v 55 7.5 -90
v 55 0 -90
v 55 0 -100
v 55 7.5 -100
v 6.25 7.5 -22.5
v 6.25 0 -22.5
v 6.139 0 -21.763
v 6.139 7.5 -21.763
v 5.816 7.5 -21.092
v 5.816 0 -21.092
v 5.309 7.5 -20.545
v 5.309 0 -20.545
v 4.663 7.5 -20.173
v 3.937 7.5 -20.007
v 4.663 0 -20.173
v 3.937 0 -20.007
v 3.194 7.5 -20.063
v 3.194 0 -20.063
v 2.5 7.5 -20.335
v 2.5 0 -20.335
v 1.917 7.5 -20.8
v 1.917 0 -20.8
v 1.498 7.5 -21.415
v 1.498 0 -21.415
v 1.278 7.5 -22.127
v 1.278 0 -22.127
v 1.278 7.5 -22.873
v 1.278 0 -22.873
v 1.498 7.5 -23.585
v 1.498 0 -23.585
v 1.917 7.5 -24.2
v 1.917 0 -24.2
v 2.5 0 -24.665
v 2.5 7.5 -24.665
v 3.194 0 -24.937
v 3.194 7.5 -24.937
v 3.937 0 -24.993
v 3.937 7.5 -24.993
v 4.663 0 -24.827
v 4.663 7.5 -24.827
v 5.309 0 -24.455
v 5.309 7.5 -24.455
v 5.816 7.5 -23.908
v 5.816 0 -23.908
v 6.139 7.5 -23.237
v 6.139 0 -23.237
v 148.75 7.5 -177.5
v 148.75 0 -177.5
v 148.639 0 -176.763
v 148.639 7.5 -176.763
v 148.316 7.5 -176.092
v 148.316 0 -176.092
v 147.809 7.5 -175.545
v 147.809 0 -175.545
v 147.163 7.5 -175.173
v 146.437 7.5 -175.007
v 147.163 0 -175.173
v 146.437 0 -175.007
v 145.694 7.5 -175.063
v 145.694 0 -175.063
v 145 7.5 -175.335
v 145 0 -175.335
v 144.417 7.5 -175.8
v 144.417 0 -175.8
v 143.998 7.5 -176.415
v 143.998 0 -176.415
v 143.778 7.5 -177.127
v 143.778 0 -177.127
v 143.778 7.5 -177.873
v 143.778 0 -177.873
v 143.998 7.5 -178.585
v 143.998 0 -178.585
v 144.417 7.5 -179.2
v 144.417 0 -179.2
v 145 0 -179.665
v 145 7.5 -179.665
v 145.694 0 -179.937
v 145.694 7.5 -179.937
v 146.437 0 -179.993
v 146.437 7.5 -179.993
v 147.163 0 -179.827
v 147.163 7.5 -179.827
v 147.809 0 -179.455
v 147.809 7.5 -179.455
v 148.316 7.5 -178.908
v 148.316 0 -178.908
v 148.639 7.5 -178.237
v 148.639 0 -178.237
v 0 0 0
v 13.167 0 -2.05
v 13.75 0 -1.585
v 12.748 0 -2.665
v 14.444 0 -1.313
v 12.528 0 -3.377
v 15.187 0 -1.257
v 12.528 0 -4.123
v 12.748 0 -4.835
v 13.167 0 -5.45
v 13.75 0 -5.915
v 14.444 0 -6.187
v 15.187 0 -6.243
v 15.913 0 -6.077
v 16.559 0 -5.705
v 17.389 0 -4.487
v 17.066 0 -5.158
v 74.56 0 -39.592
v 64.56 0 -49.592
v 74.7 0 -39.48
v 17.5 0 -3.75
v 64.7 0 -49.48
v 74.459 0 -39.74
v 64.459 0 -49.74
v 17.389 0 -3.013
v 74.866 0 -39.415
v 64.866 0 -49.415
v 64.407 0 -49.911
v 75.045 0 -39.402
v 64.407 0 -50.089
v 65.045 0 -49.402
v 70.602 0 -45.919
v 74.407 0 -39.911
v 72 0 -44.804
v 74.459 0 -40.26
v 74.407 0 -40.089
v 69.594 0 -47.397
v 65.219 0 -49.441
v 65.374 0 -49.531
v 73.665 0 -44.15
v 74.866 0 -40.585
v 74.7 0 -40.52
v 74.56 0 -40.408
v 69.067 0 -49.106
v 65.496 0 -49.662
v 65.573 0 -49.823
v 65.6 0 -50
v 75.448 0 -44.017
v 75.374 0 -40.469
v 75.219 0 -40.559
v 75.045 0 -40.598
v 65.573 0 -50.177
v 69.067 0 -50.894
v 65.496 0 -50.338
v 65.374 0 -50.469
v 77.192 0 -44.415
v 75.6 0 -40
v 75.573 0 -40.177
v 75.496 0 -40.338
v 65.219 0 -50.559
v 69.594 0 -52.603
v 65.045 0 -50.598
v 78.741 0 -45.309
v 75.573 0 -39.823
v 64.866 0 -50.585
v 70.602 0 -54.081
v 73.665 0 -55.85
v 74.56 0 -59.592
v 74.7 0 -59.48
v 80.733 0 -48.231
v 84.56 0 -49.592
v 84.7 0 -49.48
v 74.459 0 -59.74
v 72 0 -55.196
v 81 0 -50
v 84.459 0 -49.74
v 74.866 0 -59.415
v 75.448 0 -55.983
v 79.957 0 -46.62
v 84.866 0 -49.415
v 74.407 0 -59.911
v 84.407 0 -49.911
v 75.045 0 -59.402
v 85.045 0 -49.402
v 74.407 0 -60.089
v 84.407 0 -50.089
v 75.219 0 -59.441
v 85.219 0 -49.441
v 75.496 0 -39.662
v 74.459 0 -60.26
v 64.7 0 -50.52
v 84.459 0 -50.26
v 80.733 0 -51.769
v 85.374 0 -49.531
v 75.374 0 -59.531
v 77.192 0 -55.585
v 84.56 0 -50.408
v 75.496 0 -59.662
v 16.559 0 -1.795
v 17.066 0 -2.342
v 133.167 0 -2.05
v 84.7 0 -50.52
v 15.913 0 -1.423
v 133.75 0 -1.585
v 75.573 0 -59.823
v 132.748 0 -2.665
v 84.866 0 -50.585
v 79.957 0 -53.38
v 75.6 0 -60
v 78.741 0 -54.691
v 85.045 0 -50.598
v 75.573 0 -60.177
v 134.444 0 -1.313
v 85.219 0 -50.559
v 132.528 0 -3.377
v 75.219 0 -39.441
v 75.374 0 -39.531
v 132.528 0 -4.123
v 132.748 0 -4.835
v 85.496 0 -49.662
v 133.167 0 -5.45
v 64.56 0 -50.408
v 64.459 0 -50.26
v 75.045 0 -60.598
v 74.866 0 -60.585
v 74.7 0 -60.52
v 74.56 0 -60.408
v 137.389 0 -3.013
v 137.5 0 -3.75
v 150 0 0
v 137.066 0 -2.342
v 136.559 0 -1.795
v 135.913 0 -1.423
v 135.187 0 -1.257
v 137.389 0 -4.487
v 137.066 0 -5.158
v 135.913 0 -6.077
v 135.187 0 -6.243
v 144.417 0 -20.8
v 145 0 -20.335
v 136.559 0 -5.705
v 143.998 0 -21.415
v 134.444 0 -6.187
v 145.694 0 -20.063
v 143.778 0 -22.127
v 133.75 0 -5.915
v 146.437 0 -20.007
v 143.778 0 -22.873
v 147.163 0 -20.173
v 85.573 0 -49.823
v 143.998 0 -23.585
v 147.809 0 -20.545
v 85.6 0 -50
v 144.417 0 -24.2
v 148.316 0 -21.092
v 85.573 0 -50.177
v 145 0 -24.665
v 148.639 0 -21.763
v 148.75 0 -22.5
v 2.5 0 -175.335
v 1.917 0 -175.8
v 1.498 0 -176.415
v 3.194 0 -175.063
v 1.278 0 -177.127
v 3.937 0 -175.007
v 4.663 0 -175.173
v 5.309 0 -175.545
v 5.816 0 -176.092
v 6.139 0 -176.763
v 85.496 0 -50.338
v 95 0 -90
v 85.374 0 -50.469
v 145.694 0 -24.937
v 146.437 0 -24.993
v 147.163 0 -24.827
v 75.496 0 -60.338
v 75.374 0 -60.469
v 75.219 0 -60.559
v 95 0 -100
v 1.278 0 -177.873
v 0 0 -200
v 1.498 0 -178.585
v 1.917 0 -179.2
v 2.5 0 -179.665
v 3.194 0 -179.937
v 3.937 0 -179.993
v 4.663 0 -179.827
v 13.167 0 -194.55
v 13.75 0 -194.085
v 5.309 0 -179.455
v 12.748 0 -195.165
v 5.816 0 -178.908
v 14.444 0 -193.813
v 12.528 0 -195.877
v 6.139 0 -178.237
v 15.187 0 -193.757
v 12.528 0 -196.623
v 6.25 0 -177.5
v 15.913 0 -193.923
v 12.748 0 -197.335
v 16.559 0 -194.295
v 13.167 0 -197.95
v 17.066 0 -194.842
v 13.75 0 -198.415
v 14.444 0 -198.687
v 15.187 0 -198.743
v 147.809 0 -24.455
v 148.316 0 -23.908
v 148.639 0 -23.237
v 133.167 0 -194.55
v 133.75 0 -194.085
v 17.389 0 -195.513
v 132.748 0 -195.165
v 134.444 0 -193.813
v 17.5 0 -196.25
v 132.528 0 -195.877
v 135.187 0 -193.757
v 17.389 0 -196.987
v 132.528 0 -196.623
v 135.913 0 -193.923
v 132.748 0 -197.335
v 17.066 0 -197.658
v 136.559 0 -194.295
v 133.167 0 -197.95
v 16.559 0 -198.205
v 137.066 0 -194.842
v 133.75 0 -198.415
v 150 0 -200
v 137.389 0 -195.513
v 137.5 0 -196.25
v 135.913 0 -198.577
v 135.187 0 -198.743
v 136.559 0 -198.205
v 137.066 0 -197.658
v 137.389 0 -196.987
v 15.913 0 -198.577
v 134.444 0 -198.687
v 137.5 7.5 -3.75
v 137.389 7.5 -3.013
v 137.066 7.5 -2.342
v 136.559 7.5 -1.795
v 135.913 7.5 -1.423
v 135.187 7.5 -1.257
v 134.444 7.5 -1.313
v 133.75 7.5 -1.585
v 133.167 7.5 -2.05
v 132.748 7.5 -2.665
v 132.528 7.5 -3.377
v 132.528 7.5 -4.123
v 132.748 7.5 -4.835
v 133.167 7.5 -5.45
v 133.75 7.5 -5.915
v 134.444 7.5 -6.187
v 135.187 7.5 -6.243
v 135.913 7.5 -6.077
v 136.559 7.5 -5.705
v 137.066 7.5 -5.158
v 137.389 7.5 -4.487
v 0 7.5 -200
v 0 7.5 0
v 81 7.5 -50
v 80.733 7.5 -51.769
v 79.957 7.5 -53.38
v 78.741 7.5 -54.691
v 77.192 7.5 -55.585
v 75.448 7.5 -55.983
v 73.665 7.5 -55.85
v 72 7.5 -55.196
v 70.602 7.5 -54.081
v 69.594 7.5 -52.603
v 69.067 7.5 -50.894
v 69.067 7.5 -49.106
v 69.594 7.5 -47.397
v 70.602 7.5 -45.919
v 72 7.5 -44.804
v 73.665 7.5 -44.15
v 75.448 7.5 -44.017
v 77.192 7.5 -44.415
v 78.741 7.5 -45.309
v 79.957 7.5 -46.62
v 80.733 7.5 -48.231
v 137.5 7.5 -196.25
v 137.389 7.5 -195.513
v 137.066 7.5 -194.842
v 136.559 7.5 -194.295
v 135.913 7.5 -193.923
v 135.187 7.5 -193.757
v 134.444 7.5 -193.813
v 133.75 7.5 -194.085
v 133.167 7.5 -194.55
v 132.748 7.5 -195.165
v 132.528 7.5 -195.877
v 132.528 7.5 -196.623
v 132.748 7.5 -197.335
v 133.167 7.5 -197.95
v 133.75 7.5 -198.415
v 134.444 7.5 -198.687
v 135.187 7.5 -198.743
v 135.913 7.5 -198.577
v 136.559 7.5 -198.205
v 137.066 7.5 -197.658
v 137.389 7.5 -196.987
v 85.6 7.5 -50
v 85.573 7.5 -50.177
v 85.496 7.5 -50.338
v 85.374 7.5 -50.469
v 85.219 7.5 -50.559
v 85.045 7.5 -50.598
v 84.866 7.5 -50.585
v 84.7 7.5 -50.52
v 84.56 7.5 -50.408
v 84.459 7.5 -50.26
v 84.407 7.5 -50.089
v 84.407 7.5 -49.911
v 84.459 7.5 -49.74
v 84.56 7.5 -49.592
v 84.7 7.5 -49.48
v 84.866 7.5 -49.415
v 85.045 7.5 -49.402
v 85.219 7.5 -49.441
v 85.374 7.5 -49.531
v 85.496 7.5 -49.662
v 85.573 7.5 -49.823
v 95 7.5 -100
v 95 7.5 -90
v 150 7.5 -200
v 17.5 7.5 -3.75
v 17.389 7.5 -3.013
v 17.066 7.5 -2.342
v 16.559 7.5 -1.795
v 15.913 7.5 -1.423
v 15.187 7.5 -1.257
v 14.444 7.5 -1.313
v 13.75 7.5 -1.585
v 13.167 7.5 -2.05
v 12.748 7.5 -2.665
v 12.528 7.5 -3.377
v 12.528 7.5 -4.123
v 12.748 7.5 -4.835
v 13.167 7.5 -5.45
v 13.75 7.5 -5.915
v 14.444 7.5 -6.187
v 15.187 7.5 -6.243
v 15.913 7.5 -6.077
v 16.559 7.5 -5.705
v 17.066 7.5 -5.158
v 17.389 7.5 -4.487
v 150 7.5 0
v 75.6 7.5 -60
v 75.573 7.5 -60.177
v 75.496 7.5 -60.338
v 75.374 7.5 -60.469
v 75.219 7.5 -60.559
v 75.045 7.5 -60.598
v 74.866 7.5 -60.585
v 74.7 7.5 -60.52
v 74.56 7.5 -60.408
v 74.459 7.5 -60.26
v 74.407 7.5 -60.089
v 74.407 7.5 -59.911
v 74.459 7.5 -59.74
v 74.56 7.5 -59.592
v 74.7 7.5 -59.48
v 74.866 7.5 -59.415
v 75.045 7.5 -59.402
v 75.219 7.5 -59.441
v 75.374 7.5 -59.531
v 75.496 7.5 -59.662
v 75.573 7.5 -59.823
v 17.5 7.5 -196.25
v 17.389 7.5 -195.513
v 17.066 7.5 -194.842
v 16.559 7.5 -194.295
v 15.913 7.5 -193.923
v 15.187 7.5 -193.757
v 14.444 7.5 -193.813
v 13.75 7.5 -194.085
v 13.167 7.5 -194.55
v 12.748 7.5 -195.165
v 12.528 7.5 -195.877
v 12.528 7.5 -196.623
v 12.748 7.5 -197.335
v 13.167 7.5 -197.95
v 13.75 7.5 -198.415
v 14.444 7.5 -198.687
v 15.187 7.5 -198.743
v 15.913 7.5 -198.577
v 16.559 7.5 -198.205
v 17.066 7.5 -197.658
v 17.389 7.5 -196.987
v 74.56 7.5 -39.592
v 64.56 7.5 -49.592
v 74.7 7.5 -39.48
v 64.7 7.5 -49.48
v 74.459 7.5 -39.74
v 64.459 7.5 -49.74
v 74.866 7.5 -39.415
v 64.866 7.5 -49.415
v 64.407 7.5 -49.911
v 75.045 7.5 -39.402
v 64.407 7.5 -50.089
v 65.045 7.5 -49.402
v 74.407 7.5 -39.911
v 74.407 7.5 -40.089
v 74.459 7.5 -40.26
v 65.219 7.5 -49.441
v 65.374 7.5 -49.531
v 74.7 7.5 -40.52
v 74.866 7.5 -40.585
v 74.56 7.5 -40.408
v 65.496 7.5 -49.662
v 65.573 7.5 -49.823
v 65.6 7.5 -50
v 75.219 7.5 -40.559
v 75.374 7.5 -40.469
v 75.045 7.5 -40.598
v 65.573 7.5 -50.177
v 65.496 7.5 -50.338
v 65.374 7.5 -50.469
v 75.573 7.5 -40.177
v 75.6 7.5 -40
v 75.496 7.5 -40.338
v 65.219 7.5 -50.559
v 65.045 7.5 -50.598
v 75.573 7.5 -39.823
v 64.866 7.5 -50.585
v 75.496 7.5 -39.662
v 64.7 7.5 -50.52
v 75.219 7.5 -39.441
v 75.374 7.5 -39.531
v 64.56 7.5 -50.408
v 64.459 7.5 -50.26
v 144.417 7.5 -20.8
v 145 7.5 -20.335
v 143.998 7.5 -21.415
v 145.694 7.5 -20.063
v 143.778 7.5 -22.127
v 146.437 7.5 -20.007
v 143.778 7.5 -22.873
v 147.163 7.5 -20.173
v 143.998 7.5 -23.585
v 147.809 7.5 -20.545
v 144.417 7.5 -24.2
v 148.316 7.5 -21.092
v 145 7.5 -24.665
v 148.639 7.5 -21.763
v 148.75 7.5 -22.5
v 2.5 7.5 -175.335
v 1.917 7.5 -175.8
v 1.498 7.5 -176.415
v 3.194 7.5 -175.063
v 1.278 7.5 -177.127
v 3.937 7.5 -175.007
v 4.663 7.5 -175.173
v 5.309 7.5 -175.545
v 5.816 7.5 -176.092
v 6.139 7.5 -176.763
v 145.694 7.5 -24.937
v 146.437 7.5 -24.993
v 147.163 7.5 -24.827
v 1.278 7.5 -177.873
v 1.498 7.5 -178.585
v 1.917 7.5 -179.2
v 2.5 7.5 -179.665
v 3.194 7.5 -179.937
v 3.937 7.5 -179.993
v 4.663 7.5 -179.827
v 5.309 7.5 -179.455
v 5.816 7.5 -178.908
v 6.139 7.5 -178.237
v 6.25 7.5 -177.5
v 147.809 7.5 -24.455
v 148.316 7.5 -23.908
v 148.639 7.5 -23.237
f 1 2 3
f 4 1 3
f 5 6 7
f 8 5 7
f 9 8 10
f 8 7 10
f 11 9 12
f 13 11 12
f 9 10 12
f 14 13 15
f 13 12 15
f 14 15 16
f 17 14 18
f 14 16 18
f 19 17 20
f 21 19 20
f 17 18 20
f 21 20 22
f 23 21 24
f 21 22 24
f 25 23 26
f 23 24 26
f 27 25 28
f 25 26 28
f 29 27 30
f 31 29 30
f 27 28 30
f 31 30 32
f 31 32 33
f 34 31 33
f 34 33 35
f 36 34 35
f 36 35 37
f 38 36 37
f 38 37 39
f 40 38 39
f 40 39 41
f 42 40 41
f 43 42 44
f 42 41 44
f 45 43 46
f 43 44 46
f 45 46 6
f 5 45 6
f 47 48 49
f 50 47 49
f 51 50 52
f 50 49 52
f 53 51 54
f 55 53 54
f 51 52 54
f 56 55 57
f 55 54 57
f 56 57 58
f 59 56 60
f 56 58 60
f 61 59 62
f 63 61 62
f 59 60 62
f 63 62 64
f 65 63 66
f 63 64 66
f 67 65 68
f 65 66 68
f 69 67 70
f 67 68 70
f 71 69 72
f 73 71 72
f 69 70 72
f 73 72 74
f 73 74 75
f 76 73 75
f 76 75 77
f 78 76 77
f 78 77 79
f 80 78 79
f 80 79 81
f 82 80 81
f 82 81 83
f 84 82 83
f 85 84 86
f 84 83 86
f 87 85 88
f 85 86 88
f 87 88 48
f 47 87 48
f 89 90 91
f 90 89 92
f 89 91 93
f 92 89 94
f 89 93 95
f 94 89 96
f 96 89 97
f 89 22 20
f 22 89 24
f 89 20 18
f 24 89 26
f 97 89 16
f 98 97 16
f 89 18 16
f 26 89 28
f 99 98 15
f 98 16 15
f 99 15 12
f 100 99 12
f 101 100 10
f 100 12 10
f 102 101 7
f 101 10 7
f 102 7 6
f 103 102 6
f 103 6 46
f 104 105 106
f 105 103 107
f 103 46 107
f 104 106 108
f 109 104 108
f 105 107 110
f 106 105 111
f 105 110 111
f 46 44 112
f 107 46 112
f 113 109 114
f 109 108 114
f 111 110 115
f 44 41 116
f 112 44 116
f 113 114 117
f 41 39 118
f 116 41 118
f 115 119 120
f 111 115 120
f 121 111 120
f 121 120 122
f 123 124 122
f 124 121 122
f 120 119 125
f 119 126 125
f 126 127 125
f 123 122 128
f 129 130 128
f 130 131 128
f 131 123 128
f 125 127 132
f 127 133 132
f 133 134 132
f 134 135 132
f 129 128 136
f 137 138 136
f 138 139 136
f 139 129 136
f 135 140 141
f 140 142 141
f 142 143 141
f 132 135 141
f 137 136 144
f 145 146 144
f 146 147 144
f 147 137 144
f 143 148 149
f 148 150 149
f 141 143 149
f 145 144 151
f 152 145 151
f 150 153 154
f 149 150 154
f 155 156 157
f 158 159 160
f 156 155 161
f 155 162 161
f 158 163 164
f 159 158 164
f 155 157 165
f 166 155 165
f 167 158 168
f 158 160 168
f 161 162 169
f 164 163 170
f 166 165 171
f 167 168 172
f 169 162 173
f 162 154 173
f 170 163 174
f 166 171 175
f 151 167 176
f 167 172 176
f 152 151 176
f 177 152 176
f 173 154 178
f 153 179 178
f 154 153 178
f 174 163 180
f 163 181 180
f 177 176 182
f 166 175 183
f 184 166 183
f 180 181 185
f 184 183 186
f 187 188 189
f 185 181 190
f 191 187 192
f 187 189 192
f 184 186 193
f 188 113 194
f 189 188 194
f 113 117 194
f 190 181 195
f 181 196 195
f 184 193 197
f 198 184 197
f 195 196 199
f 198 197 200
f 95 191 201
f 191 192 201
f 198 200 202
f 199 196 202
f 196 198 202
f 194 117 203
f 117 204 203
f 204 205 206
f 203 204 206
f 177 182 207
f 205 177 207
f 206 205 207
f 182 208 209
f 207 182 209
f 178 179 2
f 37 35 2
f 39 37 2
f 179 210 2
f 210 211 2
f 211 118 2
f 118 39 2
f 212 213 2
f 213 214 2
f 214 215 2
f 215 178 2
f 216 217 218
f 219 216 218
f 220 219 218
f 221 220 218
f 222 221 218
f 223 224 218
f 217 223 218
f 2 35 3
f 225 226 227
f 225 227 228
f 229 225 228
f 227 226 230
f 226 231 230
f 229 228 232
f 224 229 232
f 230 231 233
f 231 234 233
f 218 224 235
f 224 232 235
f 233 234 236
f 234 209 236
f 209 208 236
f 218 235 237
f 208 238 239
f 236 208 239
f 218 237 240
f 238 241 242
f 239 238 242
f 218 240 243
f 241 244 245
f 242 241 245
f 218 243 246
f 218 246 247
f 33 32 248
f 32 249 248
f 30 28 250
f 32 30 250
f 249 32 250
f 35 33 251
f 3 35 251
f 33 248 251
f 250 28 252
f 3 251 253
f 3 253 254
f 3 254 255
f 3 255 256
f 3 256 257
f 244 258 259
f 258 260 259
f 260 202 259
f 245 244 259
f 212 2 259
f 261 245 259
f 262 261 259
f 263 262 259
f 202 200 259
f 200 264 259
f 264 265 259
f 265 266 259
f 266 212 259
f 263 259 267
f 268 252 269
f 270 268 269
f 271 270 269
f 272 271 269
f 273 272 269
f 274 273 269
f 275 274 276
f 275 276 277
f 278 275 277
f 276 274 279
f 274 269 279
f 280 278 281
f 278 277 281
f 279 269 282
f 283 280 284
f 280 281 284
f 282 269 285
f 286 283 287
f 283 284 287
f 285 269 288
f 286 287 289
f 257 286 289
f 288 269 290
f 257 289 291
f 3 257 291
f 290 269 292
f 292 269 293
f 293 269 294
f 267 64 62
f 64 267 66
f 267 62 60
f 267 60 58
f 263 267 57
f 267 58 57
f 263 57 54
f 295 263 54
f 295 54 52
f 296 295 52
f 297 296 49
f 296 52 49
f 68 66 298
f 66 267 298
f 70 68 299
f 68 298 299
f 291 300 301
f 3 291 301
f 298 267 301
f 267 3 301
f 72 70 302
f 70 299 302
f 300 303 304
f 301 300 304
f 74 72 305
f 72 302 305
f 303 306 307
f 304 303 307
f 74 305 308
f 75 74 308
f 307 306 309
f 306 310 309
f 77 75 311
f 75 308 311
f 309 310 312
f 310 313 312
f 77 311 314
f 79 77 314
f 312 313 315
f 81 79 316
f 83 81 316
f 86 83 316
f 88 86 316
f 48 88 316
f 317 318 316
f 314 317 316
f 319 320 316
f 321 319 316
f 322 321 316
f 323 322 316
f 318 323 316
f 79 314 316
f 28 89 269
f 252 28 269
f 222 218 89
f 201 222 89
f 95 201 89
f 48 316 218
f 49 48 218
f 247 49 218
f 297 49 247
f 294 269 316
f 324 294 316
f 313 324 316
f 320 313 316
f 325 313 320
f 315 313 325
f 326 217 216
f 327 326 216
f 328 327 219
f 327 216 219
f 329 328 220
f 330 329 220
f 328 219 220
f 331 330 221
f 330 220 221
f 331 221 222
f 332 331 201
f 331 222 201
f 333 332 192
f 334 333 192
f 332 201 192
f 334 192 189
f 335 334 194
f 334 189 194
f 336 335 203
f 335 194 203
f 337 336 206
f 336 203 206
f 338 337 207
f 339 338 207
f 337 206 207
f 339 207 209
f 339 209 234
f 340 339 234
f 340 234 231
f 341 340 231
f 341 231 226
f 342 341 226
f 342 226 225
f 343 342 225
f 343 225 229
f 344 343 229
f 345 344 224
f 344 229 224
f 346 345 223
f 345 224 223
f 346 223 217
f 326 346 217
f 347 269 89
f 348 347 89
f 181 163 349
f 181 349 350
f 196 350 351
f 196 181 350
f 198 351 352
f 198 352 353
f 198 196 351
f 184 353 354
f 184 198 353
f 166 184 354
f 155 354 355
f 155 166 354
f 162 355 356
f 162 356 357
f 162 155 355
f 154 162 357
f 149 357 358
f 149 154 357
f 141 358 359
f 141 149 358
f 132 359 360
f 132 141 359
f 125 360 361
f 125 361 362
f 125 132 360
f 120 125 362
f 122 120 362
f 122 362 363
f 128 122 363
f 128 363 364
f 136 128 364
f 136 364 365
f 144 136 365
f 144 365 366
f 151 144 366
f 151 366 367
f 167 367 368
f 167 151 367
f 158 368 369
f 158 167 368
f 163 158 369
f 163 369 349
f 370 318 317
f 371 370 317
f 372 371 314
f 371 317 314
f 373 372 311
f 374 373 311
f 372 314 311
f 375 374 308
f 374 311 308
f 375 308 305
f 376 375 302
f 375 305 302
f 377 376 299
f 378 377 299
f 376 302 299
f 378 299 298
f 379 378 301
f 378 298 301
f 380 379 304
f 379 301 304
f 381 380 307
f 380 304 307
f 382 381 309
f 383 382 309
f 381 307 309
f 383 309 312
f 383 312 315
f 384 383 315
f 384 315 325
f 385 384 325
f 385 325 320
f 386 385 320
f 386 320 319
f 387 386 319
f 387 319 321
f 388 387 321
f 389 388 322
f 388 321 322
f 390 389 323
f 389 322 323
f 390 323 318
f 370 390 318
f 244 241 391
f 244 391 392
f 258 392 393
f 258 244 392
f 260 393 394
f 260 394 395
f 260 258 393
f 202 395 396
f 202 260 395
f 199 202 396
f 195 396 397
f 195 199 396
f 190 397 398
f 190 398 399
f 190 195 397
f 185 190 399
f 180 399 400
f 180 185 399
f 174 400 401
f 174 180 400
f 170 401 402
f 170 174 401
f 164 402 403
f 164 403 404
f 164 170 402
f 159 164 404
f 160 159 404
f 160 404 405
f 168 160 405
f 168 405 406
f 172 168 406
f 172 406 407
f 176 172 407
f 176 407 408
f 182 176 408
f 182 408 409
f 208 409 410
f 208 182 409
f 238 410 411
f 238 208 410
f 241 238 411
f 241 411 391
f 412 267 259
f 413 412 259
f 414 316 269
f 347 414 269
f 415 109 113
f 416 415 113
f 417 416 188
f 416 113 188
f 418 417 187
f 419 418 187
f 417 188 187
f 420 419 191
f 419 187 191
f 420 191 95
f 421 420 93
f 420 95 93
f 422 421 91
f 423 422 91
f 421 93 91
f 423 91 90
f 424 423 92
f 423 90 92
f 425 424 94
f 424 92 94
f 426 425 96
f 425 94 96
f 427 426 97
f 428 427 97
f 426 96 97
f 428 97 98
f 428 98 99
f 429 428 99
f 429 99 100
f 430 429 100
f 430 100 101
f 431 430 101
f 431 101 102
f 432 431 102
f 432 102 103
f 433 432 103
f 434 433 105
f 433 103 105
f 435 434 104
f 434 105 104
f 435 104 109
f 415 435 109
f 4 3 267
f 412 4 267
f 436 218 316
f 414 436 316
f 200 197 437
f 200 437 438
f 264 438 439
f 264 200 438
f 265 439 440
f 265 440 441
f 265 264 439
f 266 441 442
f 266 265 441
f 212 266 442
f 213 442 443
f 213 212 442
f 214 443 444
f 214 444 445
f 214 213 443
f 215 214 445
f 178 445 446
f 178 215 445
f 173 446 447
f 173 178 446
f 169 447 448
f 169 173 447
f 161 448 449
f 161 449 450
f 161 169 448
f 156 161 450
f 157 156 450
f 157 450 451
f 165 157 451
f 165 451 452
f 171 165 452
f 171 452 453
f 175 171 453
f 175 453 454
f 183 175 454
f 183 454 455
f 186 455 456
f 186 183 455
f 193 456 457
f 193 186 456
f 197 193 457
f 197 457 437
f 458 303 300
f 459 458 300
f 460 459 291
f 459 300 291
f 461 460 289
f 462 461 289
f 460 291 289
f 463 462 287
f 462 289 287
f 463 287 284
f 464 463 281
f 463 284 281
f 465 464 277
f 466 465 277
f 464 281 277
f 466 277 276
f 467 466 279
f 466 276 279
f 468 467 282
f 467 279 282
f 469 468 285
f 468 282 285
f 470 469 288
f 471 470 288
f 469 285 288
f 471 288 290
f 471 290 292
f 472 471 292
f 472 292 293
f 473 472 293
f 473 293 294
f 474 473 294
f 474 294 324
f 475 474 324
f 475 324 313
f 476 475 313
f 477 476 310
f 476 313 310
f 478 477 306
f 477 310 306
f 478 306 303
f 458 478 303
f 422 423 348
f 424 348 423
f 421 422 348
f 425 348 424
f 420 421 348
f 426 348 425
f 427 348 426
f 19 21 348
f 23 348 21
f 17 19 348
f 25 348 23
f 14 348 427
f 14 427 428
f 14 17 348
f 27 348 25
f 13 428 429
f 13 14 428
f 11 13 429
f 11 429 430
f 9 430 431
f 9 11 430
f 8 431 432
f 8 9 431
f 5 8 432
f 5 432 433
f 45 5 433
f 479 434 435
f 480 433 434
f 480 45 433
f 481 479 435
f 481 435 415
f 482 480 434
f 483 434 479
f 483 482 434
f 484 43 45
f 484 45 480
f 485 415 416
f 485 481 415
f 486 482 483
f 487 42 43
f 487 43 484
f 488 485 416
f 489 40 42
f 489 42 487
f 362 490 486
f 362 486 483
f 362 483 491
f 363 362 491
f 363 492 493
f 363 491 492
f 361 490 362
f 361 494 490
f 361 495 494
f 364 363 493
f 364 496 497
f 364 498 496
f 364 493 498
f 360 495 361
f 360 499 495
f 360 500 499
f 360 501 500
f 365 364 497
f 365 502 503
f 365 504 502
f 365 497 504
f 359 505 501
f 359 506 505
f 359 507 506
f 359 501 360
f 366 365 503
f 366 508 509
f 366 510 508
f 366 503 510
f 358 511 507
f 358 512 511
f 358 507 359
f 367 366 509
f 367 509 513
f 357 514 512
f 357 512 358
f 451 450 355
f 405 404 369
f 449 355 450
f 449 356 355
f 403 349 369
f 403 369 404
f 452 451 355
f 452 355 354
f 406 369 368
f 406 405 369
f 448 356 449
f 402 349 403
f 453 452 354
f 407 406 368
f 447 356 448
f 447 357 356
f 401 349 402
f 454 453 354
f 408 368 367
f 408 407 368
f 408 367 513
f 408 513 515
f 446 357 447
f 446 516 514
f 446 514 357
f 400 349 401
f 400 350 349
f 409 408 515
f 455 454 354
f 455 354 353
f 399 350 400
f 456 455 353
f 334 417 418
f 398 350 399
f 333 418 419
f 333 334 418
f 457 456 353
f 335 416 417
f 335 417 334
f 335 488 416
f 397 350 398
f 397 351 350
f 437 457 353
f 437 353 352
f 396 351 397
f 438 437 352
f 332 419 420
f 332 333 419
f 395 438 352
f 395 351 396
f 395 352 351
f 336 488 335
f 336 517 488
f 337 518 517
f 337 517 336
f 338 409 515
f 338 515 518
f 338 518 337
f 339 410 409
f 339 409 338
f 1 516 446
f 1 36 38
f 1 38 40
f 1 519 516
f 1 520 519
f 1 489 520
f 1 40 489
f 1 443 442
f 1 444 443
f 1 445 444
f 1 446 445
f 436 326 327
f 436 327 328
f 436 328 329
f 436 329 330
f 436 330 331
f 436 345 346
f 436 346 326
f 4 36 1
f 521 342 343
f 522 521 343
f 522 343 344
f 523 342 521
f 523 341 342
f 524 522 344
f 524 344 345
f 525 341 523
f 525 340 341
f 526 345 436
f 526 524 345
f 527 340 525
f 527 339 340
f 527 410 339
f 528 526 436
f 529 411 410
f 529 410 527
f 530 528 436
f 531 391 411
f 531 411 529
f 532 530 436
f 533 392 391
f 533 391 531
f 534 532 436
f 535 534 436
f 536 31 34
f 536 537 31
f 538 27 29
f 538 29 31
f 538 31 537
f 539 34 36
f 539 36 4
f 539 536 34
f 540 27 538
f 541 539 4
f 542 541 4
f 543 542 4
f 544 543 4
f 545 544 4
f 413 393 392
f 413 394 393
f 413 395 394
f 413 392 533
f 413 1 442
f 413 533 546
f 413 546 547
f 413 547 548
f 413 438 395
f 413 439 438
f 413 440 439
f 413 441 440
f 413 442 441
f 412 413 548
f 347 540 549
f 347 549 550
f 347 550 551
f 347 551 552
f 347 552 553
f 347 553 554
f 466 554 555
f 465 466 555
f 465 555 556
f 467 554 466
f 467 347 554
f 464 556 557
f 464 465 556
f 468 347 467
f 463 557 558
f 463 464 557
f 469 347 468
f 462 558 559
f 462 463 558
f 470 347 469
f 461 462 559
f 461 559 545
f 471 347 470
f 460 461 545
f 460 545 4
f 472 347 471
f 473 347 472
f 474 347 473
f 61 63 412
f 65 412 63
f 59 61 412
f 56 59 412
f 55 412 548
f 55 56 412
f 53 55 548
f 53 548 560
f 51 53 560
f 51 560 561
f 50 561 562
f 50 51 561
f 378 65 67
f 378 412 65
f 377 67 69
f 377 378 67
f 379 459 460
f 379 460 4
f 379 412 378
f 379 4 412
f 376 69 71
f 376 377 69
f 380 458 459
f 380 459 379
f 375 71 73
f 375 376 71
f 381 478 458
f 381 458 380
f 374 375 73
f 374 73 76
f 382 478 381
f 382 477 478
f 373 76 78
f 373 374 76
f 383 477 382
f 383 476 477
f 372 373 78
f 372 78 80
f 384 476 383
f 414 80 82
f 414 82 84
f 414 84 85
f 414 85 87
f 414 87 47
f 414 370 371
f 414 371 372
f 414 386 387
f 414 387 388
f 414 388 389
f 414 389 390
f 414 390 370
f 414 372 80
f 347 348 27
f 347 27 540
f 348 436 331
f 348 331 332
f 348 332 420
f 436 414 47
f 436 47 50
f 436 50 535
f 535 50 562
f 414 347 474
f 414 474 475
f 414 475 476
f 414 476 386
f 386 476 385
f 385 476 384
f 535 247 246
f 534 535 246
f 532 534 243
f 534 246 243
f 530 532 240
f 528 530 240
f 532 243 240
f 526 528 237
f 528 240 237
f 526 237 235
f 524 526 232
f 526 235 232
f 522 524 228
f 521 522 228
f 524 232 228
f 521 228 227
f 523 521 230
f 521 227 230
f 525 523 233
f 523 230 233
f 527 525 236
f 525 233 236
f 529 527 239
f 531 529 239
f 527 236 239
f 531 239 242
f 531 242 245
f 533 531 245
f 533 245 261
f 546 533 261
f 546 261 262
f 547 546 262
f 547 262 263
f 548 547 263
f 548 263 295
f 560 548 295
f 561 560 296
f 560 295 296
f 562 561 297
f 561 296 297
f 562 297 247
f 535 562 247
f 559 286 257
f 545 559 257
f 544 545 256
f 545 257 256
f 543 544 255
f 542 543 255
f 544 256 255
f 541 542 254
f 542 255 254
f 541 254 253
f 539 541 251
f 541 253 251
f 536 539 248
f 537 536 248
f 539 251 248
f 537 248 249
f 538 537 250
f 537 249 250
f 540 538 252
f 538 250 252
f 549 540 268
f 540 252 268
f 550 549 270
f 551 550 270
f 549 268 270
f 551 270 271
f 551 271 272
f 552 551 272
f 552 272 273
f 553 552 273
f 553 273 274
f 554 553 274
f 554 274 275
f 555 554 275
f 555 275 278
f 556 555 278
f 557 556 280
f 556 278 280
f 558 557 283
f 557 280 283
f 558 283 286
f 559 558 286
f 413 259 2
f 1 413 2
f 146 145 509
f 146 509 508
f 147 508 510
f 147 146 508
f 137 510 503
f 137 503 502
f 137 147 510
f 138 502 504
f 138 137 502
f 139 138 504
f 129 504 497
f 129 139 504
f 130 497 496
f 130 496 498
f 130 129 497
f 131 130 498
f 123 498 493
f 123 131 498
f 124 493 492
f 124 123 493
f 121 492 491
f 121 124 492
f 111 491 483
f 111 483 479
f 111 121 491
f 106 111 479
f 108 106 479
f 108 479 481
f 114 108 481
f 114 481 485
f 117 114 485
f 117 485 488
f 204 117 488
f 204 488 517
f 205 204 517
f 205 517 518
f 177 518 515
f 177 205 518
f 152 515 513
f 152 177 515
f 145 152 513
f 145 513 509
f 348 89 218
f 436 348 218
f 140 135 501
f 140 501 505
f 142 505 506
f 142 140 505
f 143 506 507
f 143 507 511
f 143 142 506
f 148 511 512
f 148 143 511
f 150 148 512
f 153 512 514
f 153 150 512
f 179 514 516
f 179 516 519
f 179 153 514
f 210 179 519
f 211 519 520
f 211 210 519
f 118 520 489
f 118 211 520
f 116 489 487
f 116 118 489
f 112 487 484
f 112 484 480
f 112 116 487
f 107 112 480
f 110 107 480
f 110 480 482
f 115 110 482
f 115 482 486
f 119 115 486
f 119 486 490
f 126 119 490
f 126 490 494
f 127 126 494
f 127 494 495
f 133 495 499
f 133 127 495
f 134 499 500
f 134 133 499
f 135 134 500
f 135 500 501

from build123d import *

# Parameters (mm, degrees)
CROQUIS1_R              = 0.6
CROQUIS1_R_2            = 6
SALIENTE_EXTRUIR2_DEPTH = 7.5
CROQUIS4_R              = 2.5
CORTAR_EXTRUIR1_DEPTH   = 7.5


with BuildPart() as part:
    # Croquis1 → Saliente-Extruir2 (new body)
    with BuildSketch(Plane(origin=(0, 0, 0), x_dir=(1, 0, 0), z_dir=(0, 1, 0))):
        Polygon((0, 200), (0, 100), (55, 100), (95, 100), (150, 100), (150, 200), align=None)
        Polygon((55, 100), (0, 100), (0, 0), (150, 0), (150, 100), (95, 100), (95, 90), (75, 90), (55, 90), align=None)
        with Locations((75, 40)):
            Circle(CROQUIS1_R, mode=Mode.SUBTRACT)
        with Locations((65, 50)):
            Circle(CROQUIS1_R, mode=Mode.SUBTRACT)
        with Locations((75, 50)):
            Circle(CROQUIS1_R_2, mode=Mode.SUBTRACT)
        with Locations((75, 60)):
            Circle(CROQUIS1_R, mode=Mode.SUBTRACT)
        with Locations((85, 50)):
            Circle(CROQUIS1_R, mode=Mode.SUBTRACT)
    extrude(amount=SALIENTE_EXTRUIR2_DEPTH)

    # Croquis4 → Cortar-Extruir1 (cut)
    with BuildSketch(Plane.XZ):
        with Locations((135, -3.75)):
            Circle(CROQUIS4_R)
        with Locations((146.25, -22.5)):
            Circle(CROQUIS4_R)
        with Locations((3.75, -22.5)):
            Circle(CROQUIS4_R)
        with Locations((15, -3.75)):
            Circle(CROQUIS4_R)
        with Locations((146.25, -177.5)):
            Circle(CROQUIS4_R)
        with Locations((135, -196.25)):
            Circle(CROQUIS4_R)
        with Locations((3.75, -177.5)):
            Circle(CROQUIS4_R)
        with Locations((15, -196.25)):
            Circle(CROQUIS4_R)
    extrude(amount=-CORTAR_EXTRUIR1_DEPTH, mode=Mode.SUBTRACT)


solid = part.part
